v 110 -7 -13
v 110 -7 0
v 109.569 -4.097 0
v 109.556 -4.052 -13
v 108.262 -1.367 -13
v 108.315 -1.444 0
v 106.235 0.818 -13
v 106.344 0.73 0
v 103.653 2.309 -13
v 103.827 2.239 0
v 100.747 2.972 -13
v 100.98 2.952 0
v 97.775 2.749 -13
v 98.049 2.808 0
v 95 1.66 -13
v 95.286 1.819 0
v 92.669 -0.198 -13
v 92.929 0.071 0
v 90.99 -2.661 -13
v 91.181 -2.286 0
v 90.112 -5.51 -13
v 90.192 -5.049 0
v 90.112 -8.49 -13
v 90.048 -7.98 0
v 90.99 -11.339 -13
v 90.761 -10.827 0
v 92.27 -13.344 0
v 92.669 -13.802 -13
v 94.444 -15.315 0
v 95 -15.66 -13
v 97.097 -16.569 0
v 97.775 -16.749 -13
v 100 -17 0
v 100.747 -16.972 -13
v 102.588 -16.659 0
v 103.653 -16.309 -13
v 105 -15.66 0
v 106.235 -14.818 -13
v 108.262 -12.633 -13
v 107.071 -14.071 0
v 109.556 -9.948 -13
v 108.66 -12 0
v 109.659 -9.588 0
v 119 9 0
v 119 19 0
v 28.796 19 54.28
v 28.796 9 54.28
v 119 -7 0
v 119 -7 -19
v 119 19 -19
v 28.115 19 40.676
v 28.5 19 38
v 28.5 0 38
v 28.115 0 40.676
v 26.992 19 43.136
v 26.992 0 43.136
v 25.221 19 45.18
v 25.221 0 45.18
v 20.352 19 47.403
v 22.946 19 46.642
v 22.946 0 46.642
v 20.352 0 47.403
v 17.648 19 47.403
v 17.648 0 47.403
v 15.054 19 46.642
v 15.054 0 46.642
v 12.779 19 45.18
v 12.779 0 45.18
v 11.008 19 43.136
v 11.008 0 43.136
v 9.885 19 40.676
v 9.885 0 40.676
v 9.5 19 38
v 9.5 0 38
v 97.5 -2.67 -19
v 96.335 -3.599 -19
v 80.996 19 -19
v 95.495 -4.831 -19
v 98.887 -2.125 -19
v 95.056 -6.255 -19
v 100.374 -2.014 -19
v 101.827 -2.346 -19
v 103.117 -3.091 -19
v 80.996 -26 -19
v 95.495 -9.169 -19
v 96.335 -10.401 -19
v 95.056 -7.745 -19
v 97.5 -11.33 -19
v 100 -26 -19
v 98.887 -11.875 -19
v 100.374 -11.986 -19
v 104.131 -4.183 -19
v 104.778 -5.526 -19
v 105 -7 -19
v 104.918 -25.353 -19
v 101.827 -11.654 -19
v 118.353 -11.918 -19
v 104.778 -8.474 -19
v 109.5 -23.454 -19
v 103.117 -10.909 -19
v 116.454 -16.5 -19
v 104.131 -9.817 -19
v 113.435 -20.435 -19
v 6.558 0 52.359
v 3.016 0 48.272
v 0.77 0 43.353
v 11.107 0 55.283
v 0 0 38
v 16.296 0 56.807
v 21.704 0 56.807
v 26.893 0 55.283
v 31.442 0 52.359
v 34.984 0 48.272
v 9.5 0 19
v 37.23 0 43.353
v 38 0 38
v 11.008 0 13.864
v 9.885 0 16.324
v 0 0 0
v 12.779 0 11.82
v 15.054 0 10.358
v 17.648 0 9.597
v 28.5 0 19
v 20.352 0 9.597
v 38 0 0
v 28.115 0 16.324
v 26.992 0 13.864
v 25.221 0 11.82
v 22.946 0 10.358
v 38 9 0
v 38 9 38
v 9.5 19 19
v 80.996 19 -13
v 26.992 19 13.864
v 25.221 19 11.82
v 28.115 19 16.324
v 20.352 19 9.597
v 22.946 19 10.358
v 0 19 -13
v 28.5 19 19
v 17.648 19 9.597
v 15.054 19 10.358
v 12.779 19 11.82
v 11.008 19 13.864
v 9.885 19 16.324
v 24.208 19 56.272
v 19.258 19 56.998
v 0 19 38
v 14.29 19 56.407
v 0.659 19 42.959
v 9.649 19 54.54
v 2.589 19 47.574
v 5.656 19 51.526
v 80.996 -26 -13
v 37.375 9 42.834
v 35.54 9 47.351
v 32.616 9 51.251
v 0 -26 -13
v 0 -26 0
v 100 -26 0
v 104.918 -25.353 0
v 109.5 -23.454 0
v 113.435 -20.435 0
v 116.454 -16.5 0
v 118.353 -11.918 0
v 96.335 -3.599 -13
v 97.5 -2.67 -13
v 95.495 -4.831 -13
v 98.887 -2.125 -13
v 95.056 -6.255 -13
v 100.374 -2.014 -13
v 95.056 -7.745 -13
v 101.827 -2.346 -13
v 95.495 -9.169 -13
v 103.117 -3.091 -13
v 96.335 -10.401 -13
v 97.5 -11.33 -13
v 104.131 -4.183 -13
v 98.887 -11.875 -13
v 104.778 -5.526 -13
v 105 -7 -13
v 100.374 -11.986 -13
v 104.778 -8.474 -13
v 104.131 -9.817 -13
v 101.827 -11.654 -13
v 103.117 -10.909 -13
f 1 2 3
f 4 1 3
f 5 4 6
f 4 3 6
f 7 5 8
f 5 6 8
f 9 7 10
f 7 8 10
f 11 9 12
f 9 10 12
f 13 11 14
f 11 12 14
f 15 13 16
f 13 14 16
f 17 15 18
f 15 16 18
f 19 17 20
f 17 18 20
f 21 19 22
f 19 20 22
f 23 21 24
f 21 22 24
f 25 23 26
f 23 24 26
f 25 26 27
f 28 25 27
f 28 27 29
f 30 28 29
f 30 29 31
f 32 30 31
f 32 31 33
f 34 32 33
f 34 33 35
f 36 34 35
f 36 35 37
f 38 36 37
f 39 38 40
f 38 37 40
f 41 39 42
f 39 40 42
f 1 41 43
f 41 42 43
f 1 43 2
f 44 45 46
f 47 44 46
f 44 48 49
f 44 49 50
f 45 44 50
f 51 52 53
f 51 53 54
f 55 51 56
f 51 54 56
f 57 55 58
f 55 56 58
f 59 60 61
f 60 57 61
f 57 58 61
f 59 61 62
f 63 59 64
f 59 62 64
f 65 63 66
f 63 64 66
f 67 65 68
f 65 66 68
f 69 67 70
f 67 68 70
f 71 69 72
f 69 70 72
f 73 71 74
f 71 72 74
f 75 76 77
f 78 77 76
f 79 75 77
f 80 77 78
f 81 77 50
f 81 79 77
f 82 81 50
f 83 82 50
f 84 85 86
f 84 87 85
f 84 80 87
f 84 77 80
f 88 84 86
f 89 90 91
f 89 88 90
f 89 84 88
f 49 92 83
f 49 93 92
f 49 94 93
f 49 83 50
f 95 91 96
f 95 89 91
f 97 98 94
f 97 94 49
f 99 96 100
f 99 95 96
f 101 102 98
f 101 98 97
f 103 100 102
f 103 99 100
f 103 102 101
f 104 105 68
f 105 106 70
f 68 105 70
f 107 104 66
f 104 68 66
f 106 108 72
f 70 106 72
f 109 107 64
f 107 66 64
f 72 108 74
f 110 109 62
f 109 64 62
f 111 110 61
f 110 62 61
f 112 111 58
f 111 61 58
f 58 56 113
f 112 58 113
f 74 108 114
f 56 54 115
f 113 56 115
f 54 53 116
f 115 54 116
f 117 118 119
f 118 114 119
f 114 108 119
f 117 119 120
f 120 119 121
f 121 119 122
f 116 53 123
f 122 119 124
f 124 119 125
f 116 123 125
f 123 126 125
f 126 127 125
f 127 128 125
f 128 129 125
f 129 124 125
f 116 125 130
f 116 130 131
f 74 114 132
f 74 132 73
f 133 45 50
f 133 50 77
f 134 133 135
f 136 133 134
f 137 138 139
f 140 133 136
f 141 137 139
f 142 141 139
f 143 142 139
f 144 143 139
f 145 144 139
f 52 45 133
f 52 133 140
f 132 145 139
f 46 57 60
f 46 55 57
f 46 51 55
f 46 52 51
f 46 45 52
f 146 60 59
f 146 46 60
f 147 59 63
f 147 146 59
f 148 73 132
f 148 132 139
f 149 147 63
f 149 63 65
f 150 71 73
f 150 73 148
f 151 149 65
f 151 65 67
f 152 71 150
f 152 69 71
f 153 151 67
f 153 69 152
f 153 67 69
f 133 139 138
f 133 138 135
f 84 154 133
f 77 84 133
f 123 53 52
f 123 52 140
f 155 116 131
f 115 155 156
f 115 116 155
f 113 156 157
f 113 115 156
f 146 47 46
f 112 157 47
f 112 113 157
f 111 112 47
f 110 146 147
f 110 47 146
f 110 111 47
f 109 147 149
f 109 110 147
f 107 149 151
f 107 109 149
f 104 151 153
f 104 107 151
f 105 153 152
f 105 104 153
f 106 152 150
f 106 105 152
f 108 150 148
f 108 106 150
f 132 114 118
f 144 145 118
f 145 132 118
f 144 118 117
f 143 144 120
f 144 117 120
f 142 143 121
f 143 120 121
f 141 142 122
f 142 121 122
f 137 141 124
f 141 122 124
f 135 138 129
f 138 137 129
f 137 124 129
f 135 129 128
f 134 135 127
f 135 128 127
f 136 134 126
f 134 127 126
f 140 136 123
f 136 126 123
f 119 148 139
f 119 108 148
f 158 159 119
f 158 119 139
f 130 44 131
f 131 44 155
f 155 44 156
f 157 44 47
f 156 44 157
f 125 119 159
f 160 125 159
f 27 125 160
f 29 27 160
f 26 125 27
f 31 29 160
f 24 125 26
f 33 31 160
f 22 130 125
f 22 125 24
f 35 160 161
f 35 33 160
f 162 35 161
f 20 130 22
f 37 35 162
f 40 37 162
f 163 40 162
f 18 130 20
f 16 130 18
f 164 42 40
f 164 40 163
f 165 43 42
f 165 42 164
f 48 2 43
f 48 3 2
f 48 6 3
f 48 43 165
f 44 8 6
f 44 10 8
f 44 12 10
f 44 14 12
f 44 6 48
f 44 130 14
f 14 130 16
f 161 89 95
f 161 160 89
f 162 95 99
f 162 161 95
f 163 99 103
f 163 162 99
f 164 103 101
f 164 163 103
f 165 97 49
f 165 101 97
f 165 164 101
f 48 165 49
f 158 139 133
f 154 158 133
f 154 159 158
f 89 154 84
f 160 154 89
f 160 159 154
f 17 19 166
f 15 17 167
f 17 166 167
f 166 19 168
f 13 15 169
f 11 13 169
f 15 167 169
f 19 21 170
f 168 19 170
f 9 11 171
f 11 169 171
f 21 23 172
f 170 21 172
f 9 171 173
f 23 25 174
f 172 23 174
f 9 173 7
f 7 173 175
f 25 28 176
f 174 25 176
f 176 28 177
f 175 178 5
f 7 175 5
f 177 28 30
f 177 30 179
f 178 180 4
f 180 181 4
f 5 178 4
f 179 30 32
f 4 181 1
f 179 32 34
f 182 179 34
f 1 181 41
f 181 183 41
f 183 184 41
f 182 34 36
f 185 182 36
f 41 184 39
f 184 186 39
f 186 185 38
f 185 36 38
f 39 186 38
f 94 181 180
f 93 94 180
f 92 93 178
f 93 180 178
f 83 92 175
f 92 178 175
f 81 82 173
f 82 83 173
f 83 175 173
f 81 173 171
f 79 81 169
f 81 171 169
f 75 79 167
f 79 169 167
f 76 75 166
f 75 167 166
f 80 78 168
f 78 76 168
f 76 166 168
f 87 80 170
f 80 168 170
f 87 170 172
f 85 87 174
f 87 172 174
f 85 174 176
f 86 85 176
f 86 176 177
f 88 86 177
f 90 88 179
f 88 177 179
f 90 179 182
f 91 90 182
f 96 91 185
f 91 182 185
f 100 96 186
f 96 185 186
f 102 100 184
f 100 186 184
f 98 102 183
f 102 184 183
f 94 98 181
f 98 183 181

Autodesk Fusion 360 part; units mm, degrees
sketch "Sketch1" plane through (0, 0, 0) normal (0, 1, 0) x (1, 0, 0)
  line L0 (0, 0) -> (38, 0)
  line L1 (38, 0) -> (38, -38)
  line L2 (38, -38) -> (0, -38)
  line L3 (0, -38) -> (0, 0)
  circle A0 centre (19, -38) radius 19
  line L4 (9.5, -38) -> (28.5, -38)
  line L5 (28.5, -38) -> (28.5, -19)
  line L6 (28.5, -19) -> (9.5, -19)
  line L7 (9.5, -19) -> (9.5, -38)
  circle A1 centre (19, -38) radius 9.5
  circle A2 centre (19, -19) radius 9.5
  dimension "d1" = 38
  dimension "d2" = 38
  dimension "d3" = 19
  dimension "d4" = 19
  dimension "d5" = 19
  dimension "d6" = 9.5
extrude "Extrude1" add sketch "Sketch1" along normal blind 19 contours L0 L1 L3 A0 L5 L7 A2 | L2 A0 L7 | L2 A0 A1 | L2 A0 L5 makes body 1
sketch "Sketch1 (2)" plane through (0, 19, 0) normal (0, 1, 0) x (-1, 0, 0) in component "sideline"
  arc A0 (-28.5, 19) -> (-9.5, 19) centre (-19, 19) ccw
  line L0 (-28.5, 19) -> (-28.5, 38)
  arc A1 (-9.5, 38) -> (-28.5, 38) centre (-19, 38) ccw
  line L1 (-9.5, 38) -> (-9.5, 19)
  arc A2 (0, 38) -> (-38, 38) centre (-19, 38) ccw
  line L2 (-38, 38) -> (-38, 0)
  line L3 (-38, 0) -> (0, 0)
  line L4 (0, 0) -> (0, 38)
  line L5 (-38, 0) -> (-119, 0)
  line L6 (-119, 0) -> (-28.7963, 54.2798)
  dimension "d9" = 81
extrude "Extrude1'" add sketch "Sketch1 (2)" against normal blind 10 separate body contours A2 L2 L5 L6 makes body 2 in component "sideline"
combine "Combine1" operation add target body 2 tool bodies 1 in component "sideline"
sketch "Sketch2" plane through (0, 0, 0) normal (0, 0, 1) x (1, 0, 0) in component "sideline"
  line L0 (119, 19) -> (0, 19)
  line L1 (0, 19) -> (0, -26)
  line L2 (0, -26) -> (100, -26)
  line L3 (119, -7) -> (119, 19)
  line L4 (113.8585, -7) -> (125, -7)
  circle A0 centre (100, -7) radius 10
  circle A1 centre (100, -7) radius 5
  arc A2 (100, -26) -> (119, -7) centre (100, -7) ccw
  line L5 (100, -7) -> (100, -33.6154)
  line L6 (100, -26) -> (91, -26)
  line L7 (100, -26) -> (81, -26)
  line L8 (81, -26) -> (81, 19)
  dimension "d19" = 19
extrude "Extrude2" add sketch "Sketch2" against normal blind 13 contours L0 L2 L3 A2 L6 L7 L8 | L0 L1 L2 L8 bodies 2 in component "sideline"
sketch "Sketch3" plane through (0, 0, -13) normal (0, 0, -1) x (1, 0, 0) in component "sideline"
  circle A0 centre (100, 7) radius 10
  line L0 (119, -19) -> (119, 7)
  arc A1 (119, 7) -> (100, 26) centre (100, 7) ccw
  line L1 (100, 26) -> (0, 26)
  line L2 (0, 26) -> (0, -19)
  line L3 (0, -19) -> (119, -19)
  circle A2 centre (100, 7) radius 5
  line L4 (80.9955, 26) -> (80.9955, -19)
  dimension "d22" = 10
extrude "Extrude3" add sketch "Sketch3" along normal blind 6 contours A0 | L0 A1 L1 L3 L4 bodies 2 in component "sideline"
component "sideline" placed x (1, 0, 0) y (0, 1, 0) z (0, 0, 1) at (0, 0, 0)
